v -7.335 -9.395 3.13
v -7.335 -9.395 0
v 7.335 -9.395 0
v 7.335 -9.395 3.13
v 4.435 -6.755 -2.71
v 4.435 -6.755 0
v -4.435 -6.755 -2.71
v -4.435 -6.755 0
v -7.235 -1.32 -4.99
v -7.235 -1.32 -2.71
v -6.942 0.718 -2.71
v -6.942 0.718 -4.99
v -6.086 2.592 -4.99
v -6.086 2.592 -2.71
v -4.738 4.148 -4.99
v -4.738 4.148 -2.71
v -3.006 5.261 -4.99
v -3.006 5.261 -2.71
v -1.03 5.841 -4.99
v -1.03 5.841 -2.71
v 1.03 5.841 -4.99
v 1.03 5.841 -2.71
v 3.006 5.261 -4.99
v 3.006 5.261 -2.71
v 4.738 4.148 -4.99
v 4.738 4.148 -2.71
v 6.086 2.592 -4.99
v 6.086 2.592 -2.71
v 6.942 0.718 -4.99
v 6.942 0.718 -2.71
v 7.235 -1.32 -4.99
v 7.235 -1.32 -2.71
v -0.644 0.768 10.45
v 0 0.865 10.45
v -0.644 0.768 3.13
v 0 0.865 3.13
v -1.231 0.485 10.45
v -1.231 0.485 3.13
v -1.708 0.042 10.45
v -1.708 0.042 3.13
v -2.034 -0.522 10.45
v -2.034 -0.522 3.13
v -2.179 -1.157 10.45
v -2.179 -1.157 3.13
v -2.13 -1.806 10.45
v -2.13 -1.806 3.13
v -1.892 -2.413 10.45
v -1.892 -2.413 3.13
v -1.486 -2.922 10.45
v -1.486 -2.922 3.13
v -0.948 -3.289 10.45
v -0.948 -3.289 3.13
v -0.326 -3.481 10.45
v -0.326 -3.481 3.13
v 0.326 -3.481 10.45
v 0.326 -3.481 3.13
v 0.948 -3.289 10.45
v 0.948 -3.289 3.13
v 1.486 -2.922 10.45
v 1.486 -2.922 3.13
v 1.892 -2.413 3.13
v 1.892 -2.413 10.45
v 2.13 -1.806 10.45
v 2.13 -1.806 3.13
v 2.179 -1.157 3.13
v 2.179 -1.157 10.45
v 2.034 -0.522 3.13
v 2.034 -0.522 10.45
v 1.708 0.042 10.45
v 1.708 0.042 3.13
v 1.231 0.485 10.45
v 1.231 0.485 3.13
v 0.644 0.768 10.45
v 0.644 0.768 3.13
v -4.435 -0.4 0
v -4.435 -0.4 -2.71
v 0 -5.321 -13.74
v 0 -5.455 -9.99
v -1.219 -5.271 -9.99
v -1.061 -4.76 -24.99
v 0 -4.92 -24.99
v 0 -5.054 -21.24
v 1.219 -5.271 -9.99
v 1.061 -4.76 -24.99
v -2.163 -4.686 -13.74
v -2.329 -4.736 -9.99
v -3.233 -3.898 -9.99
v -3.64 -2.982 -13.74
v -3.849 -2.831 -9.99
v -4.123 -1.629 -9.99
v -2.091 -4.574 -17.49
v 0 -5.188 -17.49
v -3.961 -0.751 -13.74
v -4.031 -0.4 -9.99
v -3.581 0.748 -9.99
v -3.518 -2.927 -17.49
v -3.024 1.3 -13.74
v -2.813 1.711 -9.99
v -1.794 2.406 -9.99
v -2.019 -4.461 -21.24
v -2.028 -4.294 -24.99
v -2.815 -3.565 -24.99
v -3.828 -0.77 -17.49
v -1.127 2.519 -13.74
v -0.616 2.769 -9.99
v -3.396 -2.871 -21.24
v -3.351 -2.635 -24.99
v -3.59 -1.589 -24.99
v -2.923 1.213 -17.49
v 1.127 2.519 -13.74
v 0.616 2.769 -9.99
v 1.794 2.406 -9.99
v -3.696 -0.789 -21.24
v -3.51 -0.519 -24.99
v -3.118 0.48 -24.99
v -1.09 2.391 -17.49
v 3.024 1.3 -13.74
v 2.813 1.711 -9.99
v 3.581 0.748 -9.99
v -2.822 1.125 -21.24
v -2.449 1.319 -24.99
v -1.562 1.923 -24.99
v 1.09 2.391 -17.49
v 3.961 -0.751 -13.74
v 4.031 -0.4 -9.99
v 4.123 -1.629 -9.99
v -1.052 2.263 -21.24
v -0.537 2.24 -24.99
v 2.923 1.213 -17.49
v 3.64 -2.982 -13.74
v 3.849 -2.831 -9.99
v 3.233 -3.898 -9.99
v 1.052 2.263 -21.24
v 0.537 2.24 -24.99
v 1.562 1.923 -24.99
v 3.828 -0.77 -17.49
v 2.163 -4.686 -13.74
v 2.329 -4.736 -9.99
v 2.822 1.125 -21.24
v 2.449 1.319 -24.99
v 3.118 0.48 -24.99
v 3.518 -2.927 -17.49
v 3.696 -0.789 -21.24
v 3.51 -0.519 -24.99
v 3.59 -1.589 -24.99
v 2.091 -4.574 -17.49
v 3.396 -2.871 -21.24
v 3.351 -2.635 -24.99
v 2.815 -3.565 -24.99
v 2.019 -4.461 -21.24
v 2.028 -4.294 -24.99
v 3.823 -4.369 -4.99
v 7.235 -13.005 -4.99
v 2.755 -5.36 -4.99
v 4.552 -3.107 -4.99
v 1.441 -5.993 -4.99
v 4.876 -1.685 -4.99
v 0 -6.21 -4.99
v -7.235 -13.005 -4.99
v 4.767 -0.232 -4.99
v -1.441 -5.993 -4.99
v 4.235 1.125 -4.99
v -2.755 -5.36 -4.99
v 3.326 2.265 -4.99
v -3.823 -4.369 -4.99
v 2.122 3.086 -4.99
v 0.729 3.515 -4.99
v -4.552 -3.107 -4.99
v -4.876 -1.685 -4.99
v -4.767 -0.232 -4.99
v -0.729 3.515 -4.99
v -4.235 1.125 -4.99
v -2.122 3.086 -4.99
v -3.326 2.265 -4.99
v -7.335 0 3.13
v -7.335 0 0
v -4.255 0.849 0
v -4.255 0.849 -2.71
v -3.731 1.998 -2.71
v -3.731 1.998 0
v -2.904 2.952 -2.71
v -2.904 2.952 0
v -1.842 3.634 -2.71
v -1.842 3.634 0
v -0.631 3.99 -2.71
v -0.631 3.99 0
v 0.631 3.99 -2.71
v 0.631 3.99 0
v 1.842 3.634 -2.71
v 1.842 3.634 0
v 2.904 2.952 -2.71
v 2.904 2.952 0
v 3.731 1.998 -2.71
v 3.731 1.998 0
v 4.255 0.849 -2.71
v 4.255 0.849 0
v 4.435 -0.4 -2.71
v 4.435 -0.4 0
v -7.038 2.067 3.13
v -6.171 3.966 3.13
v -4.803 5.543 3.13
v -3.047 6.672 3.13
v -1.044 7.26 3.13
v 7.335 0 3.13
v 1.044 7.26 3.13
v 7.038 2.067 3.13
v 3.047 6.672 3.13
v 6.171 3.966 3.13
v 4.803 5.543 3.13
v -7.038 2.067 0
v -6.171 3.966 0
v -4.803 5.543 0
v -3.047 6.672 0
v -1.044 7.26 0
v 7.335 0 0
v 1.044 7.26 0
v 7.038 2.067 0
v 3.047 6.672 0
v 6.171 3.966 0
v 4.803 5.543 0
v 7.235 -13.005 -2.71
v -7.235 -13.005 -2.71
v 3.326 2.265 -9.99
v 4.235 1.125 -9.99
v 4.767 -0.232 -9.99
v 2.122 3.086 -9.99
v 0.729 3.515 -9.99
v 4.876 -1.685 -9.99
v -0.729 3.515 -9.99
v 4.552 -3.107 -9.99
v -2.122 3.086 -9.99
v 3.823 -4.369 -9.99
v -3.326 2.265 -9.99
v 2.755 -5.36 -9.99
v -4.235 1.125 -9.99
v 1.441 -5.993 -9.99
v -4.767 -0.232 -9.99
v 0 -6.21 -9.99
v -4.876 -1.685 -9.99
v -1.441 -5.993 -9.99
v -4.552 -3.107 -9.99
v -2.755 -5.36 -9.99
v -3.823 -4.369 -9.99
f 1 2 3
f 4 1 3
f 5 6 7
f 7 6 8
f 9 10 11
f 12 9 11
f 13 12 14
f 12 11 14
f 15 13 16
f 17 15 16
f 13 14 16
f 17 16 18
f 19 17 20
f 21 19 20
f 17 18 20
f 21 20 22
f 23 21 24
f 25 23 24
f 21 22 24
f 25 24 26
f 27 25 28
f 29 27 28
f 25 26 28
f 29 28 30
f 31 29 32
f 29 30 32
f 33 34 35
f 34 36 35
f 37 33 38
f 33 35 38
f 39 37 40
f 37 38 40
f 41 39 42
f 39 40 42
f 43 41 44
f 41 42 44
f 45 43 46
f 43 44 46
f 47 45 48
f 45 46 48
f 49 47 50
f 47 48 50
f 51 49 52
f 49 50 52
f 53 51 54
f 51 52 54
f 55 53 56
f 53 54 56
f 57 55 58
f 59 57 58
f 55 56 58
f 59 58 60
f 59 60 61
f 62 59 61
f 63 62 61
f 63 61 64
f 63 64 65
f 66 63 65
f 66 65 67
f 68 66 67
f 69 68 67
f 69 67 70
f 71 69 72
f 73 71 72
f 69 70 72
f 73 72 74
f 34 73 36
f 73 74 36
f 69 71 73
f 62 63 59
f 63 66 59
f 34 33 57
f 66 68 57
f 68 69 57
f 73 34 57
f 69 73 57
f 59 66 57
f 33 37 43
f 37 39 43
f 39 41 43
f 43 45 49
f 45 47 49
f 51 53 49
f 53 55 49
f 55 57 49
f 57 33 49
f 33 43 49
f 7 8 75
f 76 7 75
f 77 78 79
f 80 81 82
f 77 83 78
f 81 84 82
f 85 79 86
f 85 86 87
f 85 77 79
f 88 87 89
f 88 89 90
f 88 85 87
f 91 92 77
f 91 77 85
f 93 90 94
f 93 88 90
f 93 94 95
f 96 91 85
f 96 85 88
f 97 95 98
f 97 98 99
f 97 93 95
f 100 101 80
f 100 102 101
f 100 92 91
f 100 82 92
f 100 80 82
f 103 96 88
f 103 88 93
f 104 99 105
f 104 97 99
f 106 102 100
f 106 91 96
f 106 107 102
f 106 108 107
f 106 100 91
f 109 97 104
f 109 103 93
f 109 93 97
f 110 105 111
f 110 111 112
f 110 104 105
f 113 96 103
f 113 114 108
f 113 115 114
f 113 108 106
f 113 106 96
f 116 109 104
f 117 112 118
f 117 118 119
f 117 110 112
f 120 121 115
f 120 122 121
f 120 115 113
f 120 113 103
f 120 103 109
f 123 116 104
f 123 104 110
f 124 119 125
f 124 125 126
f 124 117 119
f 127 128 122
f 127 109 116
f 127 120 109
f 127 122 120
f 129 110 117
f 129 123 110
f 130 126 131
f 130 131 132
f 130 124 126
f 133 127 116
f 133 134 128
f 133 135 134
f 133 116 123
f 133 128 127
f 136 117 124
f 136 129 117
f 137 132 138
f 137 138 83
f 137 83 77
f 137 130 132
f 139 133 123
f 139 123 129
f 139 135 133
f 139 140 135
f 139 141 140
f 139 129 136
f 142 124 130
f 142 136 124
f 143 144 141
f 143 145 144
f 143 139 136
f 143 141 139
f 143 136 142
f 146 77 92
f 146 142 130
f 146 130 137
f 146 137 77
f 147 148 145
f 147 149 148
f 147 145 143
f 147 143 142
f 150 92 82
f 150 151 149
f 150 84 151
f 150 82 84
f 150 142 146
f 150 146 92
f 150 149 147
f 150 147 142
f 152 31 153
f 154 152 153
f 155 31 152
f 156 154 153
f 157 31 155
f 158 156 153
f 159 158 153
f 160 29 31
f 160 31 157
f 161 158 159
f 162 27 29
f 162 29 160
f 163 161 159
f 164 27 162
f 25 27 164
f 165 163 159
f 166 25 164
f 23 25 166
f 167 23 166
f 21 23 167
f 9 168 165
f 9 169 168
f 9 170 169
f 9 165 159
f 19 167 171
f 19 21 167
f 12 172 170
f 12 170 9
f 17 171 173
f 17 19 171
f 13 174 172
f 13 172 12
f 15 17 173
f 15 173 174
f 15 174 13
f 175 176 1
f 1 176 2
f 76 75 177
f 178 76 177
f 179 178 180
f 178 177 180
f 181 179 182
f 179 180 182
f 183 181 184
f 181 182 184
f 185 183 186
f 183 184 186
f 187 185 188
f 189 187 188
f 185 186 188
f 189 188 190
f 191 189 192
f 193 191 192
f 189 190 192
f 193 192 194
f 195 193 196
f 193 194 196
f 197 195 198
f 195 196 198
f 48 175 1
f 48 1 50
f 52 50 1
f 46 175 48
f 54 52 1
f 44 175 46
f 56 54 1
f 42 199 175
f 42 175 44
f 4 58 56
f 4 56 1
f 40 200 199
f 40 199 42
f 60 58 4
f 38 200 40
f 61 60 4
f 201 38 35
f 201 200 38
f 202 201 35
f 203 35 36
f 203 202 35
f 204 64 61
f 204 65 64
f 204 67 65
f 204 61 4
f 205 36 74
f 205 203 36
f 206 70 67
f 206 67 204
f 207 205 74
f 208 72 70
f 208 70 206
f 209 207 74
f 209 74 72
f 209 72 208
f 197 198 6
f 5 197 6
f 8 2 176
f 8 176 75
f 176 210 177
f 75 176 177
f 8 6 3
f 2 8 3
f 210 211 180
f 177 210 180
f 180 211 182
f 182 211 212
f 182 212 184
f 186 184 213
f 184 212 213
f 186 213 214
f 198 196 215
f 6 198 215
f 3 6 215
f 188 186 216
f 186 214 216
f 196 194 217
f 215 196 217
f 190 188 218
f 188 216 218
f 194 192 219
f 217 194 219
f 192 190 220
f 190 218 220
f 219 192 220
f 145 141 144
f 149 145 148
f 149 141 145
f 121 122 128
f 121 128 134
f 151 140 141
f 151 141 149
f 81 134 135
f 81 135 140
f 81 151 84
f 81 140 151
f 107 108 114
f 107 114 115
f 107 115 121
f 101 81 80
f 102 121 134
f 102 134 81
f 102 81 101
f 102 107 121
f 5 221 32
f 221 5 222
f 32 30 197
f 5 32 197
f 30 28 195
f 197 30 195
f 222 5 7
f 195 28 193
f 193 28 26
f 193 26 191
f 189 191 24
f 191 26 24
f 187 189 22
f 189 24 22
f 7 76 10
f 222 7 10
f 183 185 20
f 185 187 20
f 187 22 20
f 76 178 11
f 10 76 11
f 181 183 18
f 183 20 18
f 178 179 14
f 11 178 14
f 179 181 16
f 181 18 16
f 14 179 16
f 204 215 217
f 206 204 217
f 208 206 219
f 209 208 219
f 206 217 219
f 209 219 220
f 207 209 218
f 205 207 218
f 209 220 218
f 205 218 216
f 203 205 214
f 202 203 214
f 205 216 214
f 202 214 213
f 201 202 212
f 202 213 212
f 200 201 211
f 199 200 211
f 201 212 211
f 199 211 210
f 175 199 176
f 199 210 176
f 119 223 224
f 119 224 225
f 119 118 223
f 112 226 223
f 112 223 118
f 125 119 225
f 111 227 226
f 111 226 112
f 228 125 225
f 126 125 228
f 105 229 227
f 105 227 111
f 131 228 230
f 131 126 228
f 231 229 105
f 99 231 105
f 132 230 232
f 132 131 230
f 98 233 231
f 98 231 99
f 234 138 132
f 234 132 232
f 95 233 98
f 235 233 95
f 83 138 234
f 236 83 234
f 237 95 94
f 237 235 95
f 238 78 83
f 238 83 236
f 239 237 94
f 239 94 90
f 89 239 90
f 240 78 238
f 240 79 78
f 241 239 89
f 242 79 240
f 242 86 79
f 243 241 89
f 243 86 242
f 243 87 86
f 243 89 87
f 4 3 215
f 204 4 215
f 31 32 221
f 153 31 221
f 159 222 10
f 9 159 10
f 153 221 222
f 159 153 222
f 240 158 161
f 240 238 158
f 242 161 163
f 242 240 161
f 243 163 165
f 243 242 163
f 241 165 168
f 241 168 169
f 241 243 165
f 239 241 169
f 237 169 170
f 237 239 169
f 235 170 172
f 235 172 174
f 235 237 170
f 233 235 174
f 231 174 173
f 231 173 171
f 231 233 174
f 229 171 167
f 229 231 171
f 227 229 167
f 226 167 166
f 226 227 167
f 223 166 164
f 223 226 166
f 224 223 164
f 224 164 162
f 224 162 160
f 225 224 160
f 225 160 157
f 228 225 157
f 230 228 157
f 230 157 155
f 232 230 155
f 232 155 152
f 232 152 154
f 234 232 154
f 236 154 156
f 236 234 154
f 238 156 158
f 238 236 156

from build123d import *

# Parameters (mm, degrees)
BOSS_EXTRUDE1_DEPTH = 3.13
BOSS_EXTRUDE2_DEPTH = 2.71
BOSS_EXTRUDE3_DEPTH = 2.28
SKETCH6_W           = 7.320164266
SKETCH6_H           = 2.185


with BuildPart() as part:
    # Sketch1 → Boss-Extrude1 (new body)
    with BuildSketch(Plane.XY):
        with BuildLine():
            Line((-7.335, 0), (-7.335, -9.395))
            Line((-7.335, -9.395), (7.335, -9.395))
            Line((7.335, -9.395), (7.335, 0))
            ThreePointArc((7.335, 0), (0, 7.335), (-7.335, 0))
        make_face()
    extrude(amount=BOSS_EXTRUDE1_DEPTH)

    # Sketch2 → Boss-Extrude2 (add)
    with BuildSketch(Plane(origin=(0, 0, 0), x_dir=(-1, 0, 0), z_dir=(0, 0, -1))):
        with BuildLine():
            Line((-4.435, -0.4), (-4.435, -6.755))
            Line((-4.435, -6.755), (4.435, -6.755))
            Line((4.435, -6.755), (4.435, -0.4))
            ThreePointArc((4.435, -0.4), (0, 4.035), (-4.435, -0.4))
        make_face()
    extrude(amount=BOSS_EXTRUDE2_DEPTH)

    # Sketch3 → Boss-Extrude3 (add)
    with BuildSketch(Plane(origin=(0, 0, -2.71), x_dir=(-1, 0, 0), z_dir=(0, 0, -1))):
        with BuildLine():
            Line((-7.235, -13.005), (7.235, -13.005))
            Line((7.235, -13.005), (7.235, -1.32))
            ThreePointArc((7.235, -1.32), (0, 5.915), (-7.235, -1.32))
            Line((-7.235, -1.32), (-7.235, -13.005))
        make_face()
    extrude(amount=BOSS_EXTRUDE3_DEPTH)

    # Sketch5 → Revolve1 (revolve)
    with BuildSketch(Plane(origin=(0, 0, 0), x_dir=(0, 0, -1), z_dir=(1, 0, 0)), mode=Mode.PRIVATE) as revolve1_sk:
        Polygon((4.99, 3.57), (9.99, 3.57), (9.99, 2.815), (24.99, 2.28), (24.99, -1.32), (4.99, -1.32), align=None)
    revolve(revolve1_sk.sketch.rotate(Axis((0, -1.32, -24.99), (0, 0, -1)), 180), axis=Axis((0, -1.32, -24.99), (0, 0, -1)))

    # Sketch6 → Revolve2 (revolve)
    with BuildSketch(Plane(origin=(0, 0, 0), x_dir=(0, 0, -1), z_dir=(1, 0, 0))):
        with Locations((-6.790082133, -0.2275)):
            Rectangle(SKETCH6_W, SKETCH6_H)
    revolve(axis=Axis((0, -1.32, 10.450164266), (0, 0, 1)))


solid = part.part
